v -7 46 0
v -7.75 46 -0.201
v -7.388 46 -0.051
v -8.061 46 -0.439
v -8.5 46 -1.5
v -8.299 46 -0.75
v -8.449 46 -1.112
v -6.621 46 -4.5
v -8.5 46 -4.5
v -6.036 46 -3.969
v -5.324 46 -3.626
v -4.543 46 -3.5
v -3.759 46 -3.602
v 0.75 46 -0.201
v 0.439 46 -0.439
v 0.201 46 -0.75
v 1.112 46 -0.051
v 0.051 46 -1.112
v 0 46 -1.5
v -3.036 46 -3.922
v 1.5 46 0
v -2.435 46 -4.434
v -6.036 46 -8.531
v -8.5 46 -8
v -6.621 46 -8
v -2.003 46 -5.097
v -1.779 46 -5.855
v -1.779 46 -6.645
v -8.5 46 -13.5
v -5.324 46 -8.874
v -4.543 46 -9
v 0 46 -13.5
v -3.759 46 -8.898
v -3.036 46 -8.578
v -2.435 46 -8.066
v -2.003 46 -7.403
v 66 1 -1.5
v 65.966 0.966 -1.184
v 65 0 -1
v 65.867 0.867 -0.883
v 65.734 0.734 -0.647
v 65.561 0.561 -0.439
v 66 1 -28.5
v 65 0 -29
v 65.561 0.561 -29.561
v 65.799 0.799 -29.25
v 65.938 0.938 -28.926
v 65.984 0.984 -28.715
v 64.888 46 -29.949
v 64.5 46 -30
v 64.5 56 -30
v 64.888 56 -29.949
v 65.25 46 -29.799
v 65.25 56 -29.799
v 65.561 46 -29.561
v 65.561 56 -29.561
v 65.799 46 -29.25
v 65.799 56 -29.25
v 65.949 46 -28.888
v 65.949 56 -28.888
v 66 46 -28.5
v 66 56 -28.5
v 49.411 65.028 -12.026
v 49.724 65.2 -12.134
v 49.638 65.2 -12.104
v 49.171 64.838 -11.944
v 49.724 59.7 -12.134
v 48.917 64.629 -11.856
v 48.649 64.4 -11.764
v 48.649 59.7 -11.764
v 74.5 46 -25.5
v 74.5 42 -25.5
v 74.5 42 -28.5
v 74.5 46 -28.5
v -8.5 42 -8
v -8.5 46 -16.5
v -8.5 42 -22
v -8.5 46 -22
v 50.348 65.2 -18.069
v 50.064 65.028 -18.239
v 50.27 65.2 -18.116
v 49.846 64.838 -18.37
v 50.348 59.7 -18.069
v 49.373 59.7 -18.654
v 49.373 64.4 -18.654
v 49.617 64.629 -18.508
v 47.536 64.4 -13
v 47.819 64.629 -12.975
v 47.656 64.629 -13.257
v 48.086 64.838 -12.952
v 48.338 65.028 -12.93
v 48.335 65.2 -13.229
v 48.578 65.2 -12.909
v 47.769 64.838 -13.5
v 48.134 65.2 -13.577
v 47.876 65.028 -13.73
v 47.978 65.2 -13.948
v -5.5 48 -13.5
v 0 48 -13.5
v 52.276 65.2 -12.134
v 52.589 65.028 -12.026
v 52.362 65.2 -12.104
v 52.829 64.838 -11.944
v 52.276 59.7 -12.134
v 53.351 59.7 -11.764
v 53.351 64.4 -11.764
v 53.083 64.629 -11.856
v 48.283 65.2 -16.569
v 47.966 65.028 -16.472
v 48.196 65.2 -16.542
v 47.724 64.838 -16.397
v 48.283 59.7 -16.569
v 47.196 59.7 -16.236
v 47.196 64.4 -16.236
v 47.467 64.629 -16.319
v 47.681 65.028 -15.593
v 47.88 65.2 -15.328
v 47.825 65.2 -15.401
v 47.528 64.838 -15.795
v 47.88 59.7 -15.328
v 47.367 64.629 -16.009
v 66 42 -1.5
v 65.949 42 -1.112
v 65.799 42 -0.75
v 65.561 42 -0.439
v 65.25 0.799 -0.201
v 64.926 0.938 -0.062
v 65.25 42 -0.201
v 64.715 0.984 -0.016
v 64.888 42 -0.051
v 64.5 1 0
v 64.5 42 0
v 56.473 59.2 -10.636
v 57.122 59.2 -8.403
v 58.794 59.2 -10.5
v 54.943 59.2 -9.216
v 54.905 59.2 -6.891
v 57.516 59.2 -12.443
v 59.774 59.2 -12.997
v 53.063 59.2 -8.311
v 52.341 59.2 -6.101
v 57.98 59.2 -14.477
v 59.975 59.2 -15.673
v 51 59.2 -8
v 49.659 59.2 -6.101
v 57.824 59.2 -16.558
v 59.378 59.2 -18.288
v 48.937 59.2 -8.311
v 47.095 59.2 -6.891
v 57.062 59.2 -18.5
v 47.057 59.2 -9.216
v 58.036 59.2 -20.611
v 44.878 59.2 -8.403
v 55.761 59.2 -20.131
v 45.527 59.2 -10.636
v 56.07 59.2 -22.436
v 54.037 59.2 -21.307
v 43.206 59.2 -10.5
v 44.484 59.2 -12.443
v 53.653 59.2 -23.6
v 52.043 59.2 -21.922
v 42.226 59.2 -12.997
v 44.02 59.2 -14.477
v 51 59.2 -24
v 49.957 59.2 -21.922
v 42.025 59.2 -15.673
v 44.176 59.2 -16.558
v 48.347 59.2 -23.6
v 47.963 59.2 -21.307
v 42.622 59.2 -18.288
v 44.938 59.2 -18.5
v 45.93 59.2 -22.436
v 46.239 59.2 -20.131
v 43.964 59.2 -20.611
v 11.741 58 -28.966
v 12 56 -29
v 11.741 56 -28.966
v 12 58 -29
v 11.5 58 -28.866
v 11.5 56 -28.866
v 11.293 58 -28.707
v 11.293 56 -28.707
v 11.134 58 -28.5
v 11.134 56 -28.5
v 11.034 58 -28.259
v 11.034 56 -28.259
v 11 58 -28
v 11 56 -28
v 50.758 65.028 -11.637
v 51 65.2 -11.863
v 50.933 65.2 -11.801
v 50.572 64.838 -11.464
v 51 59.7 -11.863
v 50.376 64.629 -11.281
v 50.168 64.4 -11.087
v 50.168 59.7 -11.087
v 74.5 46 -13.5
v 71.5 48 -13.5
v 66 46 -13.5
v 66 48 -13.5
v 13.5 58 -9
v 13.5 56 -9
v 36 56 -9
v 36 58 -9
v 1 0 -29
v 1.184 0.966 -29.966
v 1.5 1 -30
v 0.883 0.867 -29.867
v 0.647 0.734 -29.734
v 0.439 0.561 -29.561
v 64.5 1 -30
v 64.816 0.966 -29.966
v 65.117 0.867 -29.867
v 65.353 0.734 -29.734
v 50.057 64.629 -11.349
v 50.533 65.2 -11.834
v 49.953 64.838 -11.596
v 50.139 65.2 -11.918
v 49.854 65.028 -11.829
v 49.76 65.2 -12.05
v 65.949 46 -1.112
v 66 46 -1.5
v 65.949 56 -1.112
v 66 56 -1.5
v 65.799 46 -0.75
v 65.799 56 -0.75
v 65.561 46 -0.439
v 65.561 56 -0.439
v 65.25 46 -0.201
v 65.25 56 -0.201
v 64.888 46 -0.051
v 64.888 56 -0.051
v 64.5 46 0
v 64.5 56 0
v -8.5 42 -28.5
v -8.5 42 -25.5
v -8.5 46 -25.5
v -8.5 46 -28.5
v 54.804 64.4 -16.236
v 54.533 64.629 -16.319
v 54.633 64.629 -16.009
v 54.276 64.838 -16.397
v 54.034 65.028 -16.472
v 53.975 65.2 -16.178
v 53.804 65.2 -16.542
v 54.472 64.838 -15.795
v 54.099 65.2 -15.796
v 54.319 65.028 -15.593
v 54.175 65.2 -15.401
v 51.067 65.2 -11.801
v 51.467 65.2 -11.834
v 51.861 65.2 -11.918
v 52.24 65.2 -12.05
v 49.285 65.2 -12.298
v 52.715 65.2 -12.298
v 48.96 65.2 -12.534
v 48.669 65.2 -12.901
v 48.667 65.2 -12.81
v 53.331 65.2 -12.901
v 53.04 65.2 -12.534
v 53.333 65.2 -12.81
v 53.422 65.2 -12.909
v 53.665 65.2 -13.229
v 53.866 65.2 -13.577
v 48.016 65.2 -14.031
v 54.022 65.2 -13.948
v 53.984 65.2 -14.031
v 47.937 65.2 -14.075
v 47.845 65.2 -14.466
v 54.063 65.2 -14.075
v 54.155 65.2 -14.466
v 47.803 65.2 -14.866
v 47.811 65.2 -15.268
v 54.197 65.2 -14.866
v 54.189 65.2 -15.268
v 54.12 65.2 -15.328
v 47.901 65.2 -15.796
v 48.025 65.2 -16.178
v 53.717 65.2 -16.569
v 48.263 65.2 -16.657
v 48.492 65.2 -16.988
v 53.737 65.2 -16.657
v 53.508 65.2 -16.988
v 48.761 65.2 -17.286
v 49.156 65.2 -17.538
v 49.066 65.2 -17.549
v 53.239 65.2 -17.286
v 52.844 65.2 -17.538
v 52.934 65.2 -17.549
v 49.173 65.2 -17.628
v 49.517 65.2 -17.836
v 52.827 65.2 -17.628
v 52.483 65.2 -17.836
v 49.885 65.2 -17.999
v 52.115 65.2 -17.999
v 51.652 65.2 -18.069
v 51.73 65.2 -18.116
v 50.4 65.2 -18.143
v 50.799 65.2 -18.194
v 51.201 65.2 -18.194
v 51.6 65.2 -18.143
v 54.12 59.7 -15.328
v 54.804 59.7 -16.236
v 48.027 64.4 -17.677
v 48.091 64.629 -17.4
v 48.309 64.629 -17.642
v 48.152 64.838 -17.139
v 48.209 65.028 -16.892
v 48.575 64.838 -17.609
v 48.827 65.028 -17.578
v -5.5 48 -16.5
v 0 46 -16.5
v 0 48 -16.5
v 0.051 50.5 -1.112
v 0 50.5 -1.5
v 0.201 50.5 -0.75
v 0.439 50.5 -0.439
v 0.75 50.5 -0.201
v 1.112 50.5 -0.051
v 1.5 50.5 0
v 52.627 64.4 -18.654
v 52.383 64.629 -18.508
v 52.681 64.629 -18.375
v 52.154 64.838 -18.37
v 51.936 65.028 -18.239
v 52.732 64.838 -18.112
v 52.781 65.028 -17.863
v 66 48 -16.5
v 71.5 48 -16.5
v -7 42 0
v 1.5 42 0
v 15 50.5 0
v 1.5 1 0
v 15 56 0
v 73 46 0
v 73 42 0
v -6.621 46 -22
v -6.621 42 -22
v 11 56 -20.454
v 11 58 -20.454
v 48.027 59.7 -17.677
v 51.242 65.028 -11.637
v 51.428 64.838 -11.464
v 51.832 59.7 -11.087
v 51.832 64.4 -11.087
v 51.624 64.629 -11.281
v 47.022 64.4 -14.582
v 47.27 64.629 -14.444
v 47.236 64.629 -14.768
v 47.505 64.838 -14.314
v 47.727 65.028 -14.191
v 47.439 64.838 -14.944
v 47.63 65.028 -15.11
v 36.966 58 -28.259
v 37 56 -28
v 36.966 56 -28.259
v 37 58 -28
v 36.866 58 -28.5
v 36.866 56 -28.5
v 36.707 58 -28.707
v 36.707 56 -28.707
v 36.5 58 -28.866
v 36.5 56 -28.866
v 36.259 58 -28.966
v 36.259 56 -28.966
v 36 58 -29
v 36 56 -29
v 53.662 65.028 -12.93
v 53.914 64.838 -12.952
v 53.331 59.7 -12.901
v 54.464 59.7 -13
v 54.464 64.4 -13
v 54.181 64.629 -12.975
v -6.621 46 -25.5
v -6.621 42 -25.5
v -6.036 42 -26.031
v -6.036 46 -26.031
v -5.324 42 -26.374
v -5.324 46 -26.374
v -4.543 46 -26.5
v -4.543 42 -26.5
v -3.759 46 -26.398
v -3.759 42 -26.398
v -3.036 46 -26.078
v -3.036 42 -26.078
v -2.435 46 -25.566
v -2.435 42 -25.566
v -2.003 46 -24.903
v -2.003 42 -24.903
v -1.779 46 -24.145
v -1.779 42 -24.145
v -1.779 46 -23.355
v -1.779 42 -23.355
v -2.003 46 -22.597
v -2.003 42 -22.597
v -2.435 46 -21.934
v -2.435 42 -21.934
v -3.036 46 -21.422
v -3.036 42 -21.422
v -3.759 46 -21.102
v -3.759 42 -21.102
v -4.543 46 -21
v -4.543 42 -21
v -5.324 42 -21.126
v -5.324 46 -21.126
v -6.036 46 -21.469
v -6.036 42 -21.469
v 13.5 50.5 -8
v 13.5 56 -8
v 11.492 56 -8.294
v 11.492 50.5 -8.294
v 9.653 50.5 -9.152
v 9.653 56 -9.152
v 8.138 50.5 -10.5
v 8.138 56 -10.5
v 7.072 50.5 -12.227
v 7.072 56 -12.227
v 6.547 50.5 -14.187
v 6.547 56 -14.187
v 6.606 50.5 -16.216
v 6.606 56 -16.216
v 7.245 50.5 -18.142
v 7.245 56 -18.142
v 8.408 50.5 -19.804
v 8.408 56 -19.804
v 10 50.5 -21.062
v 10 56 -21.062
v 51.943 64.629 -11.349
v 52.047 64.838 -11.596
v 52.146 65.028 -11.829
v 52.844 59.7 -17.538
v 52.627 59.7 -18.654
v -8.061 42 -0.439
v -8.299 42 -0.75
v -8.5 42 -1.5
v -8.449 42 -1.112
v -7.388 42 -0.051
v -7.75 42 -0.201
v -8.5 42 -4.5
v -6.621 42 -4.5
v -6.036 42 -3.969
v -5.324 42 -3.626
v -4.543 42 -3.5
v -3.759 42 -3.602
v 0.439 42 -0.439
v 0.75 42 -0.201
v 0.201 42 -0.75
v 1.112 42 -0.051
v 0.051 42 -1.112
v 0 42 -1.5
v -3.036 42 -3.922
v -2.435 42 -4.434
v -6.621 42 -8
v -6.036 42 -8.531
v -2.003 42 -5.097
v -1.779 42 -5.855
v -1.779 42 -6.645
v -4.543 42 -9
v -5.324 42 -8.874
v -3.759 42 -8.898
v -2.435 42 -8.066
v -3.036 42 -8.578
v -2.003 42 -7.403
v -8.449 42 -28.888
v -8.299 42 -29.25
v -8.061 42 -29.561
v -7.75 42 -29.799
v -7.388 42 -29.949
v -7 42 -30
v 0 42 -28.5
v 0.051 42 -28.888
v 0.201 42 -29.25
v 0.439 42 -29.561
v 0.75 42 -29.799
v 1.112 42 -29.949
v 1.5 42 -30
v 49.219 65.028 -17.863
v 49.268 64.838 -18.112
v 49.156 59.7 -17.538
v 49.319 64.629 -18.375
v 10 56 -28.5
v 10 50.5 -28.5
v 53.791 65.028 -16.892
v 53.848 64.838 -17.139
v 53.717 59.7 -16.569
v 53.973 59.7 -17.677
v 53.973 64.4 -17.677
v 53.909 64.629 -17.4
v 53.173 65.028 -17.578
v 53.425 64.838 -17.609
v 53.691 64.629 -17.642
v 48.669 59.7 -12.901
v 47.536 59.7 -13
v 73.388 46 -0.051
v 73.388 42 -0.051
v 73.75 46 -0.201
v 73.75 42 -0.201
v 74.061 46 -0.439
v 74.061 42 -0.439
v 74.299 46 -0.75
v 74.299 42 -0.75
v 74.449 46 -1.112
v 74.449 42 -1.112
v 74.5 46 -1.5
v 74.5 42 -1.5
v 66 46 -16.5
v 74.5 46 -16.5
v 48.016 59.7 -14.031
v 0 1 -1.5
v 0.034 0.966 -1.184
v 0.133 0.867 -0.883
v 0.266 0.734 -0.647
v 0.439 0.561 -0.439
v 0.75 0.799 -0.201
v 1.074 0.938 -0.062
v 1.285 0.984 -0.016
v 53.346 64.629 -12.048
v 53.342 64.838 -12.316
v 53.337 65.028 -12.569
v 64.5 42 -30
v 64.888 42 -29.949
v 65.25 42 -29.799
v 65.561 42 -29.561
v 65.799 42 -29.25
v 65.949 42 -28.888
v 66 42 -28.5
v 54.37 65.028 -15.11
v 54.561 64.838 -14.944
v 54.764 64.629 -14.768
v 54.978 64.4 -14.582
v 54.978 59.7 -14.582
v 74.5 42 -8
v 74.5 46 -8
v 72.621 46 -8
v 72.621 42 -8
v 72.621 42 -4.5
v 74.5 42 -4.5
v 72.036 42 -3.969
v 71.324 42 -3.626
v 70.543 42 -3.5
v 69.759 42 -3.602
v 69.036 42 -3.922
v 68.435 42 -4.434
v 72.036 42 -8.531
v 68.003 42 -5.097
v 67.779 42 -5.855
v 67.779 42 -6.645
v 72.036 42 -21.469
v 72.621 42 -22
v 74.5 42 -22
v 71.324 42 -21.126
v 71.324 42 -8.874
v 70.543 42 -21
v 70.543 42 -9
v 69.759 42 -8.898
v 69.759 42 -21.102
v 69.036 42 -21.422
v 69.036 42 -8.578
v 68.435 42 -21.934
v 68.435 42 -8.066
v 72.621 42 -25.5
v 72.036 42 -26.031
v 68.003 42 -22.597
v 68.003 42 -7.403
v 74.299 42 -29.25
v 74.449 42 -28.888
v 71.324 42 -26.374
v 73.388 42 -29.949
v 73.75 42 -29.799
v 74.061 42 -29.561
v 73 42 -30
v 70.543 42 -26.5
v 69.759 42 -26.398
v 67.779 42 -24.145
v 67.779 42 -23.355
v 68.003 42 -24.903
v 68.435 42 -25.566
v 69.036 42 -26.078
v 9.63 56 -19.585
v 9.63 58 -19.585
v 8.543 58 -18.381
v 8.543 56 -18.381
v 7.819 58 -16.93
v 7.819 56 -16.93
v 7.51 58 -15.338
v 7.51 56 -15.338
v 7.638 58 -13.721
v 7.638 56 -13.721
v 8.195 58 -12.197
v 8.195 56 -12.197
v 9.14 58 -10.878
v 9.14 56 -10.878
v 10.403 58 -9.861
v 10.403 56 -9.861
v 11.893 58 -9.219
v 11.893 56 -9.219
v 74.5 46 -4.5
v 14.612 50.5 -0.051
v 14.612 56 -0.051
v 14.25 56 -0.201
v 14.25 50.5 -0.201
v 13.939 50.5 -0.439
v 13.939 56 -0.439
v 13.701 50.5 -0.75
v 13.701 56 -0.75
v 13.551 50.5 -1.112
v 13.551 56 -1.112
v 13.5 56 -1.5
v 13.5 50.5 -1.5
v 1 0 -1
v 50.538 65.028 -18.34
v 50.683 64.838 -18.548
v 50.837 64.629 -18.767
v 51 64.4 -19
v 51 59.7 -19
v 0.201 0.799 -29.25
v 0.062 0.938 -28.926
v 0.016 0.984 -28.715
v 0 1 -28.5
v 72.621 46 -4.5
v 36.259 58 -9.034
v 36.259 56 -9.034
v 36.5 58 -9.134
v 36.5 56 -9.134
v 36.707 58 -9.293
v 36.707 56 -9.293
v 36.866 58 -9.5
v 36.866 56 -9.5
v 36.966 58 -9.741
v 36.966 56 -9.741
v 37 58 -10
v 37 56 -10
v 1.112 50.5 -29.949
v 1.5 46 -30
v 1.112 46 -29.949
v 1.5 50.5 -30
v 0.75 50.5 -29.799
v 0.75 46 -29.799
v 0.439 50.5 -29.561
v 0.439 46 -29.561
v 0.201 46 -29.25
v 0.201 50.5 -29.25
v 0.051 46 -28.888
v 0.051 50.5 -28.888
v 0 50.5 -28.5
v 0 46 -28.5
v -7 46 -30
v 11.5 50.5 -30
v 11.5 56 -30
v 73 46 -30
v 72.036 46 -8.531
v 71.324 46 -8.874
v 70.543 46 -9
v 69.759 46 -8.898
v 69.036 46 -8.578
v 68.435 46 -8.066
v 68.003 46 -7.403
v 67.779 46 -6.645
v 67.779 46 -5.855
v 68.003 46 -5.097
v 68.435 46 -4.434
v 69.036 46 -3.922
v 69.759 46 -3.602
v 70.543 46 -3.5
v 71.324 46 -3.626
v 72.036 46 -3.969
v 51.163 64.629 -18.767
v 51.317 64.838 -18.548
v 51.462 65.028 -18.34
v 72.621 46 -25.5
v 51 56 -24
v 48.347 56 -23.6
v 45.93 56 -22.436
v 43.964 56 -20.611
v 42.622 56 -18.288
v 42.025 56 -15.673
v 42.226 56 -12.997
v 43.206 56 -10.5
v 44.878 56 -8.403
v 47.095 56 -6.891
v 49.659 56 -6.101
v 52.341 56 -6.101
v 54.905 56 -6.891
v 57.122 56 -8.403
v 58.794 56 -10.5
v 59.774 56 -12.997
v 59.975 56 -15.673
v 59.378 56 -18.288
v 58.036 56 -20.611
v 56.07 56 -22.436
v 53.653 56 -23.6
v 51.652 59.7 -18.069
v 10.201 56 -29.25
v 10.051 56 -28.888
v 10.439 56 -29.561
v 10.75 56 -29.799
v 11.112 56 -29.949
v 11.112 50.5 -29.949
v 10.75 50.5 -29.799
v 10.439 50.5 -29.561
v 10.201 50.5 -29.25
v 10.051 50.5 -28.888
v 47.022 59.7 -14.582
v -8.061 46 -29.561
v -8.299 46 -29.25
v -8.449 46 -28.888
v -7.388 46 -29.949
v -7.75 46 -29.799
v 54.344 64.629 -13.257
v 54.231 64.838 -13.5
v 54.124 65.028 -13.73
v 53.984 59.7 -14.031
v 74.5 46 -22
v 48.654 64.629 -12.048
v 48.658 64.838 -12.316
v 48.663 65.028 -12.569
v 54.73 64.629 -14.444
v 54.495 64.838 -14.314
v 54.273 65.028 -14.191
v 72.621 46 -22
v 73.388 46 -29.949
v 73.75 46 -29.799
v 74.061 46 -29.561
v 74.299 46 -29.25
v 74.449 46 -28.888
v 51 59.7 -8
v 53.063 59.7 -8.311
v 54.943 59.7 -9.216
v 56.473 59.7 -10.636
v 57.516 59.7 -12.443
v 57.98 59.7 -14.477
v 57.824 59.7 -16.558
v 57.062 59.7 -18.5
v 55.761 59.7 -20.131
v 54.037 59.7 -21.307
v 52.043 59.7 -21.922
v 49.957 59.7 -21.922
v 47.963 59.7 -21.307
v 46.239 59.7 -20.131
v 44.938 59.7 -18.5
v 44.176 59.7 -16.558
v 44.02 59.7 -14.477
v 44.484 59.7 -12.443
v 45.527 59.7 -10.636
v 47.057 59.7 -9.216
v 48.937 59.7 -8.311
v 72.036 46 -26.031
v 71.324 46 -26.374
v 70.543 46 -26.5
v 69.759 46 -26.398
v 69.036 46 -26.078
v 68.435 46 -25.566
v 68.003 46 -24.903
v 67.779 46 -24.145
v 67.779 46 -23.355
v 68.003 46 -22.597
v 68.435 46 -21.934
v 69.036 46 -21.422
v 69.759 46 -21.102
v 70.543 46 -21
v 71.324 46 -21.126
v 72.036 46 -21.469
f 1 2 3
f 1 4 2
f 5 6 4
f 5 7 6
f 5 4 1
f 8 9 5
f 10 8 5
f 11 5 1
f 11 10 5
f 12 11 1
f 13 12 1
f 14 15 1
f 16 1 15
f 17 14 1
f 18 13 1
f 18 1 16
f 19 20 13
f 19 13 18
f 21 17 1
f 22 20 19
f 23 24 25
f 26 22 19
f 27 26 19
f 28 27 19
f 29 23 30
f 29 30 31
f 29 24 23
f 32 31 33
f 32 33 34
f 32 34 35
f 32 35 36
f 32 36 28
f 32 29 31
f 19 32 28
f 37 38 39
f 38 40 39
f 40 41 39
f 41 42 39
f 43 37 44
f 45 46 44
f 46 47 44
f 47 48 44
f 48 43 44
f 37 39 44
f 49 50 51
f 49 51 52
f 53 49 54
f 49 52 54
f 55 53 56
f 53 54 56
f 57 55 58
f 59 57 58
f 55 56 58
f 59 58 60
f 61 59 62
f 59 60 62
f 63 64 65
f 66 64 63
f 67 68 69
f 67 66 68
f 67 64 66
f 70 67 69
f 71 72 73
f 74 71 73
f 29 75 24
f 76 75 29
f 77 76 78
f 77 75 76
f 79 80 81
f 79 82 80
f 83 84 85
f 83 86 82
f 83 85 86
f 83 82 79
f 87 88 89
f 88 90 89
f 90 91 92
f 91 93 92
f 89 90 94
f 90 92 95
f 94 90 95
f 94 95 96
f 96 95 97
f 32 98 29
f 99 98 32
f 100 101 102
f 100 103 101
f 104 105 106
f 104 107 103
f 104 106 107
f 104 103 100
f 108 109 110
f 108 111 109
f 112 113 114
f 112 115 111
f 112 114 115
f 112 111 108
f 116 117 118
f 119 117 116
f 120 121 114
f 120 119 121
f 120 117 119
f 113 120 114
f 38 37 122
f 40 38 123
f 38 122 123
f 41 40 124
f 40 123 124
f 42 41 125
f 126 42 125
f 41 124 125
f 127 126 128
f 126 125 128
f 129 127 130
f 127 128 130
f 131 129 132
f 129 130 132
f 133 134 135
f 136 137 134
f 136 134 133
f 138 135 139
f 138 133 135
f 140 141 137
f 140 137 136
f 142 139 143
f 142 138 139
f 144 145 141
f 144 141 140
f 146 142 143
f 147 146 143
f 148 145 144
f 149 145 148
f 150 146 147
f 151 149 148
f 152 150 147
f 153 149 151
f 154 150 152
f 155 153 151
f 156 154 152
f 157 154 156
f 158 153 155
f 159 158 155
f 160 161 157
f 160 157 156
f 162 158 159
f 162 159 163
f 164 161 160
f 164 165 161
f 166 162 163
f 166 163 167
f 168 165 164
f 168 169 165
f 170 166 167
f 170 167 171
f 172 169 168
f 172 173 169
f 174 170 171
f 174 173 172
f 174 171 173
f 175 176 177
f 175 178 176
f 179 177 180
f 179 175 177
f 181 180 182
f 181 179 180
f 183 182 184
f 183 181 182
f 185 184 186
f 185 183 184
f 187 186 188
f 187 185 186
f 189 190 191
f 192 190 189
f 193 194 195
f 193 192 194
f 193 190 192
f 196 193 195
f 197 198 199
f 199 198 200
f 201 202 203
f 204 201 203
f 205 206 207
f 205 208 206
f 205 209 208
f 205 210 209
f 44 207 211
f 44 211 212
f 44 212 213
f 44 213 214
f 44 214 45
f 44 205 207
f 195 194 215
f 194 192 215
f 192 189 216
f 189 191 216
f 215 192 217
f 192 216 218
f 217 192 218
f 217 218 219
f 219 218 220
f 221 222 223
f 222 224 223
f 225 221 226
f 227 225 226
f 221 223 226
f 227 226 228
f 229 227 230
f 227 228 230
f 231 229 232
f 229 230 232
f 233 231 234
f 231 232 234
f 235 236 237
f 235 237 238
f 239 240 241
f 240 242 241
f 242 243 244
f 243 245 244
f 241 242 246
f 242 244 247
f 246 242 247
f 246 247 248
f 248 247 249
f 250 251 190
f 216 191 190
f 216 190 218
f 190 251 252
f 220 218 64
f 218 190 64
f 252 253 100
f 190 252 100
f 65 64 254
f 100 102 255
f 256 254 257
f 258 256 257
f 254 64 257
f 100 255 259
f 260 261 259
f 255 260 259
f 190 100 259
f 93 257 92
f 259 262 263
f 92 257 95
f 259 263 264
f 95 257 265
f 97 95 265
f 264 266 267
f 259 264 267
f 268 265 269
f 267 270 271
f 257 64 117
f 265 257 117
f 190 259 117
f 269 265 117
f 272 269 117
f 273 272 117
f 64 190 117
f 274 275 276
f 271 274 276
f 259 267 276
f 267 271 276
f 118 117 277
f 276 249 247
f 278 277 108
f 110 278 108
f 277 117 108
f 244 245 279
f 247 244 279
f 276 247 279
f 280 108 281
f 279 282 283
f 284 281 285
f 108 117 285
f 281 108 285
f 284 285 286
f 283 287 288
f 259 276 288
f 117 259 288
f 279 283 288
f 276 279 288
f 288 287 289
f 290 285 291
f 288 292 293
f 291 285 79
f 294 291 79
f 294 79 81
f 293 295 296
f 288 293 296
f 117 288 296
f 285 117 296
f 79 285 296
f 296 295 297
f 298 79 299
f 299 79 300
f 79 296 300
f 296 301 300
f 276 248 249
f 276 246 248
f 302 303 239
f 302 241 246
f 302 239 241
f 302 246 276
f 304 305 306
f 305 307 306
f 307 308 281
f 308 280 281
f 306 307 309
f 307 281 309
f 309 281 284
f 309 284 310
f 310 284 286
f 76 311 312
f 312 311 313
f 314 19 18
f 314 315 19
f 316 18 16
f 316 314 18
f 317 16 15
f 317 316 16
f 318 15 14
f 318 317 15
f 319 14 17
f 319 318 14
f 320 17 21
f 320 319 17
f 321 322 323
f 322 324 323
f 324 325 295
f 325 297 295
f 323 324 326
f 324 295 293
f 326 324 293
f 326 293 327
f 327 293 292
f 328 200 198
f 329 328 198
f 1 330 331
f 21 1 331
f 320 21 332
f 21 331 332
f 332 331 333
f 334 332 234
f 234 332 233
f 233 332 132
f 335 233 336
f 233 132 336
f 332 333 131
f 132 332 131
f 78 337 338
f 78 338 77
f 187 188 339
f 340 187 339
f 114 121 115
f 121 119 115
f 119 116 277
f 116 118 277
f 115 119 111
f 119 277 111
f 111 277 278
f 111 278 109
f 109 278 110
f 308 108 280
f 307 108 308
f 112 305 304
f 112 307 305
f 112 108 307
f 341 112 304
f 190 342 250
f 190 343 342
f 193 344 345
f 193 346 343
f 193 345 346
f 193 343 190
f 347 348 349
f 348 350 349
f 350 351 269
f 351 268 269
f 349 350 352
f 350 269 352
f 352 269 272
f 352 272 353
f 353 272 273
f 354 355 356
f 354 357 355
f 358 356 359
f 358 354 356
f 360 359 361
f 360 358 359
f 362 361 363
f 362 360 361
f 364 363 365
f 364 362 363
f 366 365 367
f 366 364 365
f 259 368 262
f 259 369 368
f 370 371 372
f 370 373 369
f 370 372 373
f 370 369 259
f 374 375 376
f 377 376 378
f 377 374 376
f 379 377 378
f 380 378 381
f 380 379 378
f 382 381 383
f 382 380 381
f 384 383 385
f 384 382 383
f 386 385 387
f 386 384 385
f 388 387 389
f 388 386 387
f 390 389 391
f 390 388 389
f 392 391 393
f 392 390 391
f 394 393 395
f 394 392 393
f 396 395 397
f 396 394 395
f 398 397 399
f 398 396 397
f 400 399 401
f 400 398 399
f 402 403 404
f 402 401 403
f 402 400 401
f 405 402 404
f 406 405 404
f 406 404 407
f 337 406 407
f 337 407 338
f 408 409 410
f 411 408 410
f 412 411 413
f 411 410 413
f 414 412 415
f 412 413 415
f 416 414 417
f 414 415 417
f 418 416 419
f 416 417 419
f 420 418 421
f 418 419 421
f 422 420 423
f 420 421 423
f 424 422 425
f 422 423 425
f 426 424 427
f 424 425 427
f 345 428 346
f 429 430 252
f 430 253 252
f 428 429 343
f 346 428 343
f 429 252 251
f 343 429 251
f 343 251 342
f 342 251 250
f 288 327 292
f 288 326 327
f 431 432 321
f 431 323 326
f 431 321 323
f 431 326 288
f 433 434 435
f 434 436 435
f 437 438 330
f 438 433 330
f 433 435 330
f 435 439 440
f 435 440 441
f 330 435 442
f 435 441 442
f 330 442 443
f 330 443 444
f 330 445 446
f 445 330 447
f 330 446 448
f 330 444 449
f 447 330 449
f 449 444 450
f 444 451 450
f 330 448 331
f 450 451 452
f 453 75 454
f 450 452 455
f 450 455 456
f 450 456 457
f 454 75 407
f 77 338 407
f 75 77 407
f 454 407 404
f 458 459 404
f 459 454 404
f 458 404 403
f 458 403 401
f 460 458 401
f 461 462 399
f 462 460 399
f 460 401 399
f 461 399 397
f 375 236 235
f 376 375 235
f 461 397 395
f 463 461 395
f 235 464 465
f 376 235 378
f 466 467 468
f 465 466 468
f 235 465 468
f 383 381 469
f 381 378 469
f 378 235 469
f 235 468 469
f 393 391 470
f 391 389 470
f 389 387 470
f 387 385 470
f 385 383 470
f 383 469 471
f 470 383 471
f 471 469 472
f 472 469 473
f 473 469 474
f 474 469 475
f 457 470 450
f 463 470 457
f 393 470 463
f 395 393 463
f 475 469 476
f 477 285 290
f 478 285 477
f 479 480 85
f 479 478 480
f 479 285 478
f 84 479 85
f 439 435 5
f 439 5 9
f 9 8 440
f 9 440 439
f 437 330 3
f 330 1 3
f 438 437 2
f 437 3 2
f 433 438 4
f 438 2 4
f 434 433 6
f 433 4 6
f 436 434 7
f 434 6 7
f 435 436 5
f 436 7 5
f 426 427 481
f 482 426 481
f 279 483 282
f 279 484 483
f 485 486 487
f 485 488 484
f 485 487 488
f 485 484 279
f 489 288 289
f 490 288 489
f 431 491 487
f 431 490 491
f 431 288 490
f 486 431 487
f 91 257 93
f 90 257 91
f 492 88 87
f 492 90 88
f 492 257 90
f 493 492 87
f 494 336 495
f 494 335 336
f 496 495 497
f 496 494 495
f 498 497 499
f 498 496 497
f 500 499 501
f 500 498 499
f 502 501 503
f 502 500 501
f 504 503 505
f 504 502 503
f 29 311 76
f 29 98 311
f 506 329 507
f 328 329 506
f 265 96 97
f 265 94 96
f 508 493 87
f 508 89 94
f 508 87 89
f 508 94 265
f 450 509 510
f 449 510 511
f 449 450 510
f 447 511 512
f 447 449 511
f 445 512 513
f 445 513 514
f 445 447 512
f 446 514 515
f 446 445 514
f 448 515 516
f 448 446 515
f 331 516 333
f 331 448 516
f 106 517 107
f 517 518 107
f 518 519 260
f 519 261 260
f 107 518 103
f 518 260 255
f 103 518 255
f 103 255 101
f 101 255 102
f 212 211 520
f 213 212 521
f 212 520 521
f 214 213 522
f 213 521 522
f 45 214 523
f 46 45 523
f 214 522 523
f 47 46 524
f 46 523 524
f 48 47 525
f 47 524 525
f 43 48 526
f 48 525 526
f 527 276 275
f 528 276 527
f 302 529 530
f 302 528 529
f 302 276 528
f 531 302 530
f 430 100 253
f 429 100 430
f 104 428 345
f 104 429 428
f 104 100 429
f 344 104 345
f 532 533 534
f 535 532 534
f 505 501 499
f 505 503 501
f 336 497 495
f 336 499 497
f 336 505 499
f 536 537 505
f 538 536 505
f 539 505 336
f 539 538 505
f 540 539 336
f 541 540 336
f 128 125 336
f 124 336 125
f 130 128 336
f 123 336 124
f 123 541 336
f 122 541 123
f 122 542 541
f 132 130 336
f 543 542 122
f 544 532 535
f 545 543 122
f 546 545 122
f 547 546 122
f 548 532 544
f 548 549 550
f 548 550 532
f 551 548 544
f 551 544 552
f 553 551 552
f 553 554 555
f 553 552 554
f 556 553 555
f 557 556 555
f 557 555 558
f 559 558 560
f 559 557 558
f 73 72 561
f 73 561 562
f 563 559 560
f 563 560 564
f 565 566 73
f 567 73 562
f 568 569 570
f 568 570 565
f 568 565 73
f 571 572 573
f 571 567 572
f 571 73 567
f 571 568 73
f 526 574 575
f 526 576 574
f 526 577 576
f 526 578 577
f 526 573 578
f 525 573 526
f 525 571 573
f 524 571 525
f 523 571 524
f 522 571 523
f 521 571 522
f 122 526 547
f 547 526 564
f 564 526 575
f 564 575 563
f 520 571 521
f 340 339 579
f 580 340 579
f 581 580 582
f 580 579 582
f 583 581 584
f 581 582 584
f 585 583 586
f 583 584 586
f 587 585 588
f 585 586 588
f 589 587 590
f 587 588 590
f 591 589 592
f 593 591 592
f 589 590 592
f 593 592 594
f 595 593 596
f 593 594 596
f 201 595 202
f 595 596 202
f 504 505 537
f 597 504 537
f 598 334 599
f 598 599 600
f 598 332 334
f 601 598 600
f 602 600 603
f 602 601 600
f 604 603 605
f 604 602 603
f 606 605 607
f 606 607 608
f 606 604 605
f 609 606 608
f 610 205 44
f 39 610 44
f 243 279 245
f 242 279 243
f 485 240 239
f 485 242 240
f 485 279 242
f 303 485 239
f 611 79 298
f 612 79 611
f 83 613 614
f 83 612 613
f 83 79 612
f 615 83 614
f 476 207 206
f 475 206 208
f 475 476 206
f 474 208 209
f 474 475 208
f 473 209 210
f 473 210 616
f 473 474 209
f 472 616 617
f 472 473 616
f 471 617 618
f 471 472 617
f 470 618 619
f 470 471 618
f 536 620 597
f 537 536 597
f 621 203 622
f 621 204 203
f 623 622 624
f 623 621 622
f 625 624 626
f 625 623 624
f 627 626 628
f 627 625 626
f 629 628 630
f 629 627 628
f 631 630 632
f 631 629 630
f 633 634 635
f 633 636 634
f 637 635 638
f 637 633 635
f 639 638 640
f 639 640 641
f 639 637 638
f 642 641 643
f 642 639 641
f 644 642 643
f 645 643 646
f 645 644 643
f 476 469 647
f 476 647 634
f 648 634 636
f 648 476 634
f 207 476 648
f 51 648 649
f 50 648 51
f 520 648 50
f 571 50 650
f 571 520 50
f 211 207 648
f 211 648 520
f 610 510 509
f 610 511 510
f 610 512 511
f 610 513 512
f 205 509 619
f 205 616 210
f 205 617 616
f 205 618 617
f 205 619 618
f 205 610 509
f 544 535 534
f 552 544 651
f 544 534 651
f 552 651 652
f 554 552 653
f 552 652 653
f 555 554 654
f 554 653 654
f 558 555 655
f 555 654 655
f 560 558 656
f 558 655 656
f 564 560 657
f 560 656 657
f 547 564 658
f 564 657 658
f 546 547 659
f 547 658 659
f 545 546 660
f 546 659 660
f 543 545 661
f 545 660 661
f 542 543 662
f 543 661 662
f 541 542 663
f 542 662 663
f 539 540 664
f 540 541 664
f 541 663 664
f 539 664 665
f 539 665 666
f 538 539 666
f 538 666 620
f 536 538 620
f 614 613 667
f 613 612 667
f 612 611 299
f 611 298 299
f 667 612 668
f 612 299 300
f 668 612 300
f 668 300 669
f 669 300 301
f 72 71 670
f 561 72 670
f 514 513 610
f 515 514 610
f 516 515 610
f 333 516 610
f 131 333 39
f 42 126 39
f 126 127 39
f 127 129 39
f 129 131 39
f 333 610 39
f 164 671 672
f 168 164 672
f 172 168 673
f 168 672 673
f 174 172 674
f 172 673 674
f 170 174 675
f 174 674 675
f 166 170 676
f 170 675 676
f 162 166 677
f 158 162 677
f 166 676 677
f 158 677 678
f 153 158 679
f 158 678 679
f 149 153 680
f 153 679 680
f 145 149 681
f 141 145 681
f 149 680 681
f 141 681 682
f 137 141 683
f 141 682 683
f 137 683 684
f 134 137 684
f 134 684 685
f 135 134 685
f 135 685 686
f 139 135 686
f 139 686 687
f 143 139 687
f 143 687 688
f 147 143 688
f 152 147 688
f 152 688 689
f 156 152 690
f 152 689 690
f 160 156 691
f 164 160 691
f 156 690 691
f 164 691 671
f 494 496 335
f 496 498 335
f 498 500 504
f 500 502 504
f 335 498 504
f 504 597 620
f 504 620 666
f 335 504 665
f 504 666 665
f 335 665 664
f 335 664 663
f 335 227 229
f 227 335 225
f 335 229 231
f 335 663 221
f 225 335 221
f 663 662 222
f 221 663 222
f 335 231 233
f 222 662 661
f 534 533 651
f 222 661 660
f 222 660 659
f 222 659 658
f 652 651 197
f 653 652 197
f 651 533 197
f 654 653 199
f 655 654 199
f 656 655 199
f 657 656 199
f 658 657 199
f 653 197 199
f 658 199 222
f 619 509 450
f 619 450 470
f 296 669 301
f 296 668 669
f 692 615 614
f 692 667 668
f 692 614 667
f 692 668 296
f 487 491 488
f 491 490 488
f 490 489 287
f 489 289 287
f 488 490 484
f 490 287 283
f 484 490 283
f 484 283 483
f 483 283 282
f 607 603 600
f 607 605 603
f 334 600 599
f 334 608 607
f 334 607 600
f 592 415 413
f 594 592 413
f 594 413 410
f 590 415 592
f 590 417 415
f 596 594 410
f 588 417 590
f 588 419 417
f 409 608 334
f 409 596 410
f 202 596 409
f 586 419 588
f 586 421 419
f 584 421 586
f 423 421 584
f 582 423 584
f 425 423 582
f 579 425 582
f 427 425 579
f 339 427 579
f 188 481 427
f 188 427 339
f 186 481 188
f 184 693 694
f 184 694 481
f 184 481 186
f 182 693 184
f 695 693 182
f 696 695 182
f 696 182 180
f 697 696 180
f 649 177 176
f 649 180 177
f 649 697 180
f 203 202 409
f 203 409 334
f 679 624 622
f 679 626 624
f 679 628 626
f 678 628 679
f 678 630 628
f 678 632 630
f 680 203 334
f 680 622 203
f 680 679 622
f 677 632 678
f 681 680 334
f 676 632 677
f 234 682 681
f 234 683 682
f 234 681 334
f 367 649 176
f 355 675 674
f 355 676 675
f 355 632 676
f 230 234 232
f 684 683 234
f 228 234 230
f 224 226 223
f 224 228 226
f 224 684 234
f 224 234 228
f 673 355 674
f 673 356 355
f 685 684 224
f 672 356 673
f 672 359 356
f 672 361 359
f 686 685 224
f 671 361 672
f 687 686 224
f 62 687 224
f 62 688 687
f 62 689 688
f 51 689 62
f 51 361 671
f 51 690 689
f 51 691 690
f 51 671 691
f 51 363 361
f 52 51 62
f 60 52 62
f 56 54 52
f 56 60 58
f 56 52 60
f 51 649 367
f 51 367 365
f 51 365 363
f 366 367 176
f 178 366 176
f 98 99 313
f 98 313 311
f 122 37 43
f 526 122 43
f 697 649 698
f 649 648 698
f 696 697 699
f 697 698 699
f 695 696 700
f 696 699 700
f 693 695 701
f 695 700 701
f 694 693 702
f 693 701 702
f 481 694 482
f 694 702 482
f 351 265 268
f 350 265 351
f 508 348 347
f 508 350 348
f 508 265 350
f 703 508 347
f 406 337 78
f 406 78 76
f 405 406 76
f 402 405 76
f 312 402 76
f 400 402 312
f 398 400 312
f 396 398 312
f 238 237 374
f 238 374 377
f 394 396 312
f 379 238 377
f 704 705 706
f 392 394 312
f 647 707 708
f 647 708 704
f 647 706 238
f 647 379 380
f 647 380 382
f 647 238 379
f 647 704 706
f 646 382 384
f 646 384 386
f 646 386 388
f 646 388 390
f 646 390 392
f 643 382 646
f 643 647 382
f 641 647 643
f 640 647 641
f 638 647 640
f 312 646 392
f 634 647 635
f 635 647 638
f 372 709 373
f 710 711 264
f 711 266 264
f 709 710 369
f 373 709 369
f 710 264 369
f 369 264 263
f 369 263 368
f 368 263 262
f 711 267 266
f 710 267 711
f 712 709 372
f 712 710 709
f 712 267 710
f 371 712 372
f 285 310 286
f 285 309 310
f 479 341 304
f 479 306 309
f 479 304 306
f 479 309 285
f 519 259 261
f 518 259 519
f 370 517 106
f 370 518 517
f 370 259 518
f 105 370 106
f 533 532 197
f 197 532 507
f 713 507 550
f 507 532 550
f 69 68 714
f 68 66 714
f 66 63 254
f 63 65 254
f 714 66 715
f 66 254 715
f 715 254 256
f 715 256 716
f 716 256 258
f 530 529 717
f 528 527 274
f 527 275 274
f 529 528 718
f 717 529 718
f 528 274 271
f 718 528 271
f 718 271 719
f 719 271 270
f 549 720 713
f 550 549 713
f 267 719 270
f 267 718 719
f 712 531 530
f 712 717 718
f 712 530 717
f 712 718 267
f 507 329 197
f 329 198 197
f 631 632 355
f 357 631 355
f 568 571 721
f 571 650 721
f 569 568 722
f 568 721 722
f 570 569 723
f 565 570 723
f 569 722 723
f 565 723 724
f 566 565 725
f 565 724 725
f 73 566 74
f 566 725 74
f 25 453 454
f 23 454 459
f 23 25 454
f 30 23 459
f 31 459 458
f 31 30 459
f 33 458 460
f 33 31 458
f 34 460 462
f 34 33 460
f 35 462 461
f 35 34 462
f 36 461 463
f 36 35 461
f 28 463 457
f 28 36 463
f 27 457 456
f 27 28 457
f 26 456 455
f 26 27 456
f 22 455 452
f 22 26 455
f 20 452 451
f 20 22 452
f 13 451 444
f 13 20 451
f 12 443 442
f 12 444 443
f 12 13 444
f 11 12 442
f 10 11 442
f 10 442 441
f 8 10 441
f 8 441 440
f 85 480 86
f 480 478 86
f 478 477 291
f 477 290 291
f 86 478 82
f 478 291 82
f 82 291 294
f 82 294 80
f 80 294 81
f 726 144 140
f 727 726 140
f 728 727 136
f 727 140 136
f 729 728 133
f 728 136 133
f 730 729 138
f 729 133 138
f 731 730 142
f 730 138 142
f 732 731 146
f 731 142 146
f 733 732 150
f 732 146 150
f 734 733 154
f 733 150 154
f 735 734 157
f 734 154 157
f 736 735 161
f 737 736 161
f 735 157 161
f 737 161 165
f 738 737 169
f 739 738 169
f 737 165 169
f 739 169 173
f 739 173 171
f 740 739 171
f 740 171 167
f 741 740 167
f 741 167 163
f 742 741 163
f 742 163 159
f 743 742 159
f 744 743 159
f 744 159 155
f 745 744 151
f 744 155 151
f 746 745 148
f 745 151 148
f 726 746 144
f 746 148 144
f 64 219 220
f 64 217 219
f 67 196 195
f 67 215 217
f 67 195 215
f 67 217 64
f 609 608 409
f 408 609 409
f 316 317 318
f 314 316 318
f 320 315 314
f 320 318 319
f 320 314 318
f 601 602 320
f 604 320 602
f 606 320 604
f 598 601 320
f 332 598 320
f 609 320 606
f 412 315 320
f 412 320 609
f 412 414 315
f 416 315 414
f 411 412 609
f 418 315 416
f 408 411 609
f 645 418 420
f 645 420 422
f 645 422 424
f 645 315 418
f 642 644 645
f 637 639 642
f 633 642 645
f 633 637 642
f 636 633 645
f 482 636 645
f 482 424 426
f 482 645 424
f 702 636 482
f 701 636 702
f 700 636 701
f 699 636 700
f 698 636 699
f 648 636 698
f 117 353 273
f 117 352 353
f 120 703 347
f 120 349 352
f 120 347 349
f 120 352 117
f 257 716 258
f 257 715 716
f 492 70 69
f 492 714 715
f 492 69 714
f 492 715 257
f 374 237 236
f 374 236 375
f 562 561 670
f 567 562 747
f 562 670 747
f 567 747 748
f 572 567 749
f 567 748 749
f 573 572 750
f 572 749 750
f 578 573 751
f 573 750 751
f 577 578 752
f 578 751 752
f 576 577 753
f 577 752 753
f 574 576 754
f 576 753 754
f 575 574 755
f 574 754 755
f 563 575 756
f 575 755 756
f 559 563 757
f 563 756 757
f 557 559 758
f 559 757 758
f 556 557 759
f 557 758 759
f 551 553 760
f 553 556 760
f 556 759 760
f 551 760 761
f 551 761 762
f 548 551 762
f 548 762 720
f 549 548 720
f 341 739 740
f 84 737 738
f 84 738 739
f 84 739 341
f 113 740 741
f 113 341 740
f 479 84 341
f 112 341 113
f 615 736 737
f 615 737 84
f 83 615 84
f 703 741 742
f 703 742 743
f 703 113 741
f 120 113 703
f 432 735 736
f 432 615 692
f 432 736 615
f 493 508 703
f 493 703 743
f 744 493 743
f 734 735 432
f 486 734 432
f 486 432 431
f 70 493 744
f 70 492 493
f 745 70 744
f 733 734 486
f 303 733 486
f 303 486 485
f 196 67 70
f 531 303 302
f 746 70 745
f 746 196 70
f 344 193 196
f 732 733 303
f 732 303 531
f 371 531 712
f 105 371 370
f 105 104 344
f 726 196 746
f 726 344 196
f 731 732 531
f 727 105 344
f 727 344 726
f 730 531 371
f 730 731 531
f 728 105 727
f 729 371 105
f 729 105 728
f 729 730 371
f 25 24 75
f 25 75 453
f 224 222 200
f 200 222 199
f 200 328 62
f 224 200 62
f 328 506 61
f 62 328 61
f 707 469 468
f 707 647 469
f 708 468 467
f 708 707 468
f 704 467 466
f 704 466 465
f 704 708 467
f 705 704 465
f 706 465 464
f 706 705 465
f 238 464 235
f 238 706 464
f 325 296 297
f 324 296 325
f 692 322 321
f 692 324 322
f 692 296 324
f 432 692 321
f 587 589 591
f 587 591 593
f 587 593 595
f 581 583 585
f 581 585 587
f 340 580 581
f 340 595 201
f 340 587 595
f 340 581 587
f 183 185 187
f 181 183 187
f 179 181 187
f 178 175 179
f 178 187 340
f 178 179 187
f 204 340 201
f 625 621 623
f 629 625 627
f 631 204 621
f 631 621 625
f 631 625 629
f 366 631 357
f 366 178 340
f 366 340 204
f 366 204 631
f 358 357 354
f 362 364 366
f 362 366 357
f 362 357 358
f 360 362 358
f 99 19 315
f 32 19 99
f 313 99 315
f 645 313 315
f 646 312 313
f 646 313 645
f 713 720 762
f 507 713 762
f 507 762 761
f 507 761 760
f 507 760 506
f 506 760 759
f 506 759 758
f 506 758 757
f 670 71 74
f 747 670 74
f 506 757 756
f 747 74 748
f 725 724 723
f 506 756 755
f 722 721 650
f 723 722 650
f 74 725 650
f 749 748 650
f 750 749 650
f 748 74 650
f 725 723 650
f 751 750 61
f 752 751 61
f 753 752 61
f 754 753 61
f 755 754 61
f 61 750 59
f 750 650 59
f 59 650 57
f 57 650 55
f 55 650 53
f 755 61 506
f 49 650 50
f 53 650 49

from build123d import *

# Parameters (mm, degrees)
SKETCH1_W            = 66
SKETCH1_H            = 30
BOSS_EXTRUDE1_DEPTH  = 56
CHAMFER1_SIZE        = 1
SKETCH3_W            = 8.5
SKETCH3_H            = 30
BOSS_EXTRUDE2_DEPTH  = 4
CUT_EXTRUDE1_REACH   = 87.86
BOSS_EXTRUDE3_DEPTH  = 1.5
FILLET2_R            = 1.5
FILLET2_OF_MIRROR1_R = 1.5
CUT_EXTRUDE2_DEPTH   = 5.5
FILLET3_R            = 1.5
BOSS_EXTRUDE4_DEPTH  = 2
FILLET4_R            = 1
SKETCH8_R            = 9
BOSS_EXTRUDE5_DEPTH  = 3.2
SKETCH9_R            = 7
BOSS_EXTRUDE6_DEPTH  = 0.5
BOSS_EXTRUDE8_DEPTH  = 5.5
CIRPATTERN1_COUNT    = 15


with BuildPart() as part:
    # Sketch1 → Boss-Extrude1 (new body)
    with BuildSketch(Plane(origin=(0, 0, 0), x_dir=(1, 0, 0), z_dir=(0, 1, 0))):
        with Locations((33, 15)):
            Rectangle(SKETCH1_W, SKETCH1_H)
    extrude(amount=BOSS_EXTRUDE1_DEPTH)

    # Chamfer1
    chamfer1_edges = [part.edges().sort_by_distance(p)[0] for p in [
        (33, 0, -30),
        (66, 0, -15),
        (33, 0, 0),
        (0, 0, -15),
    ]]
    chamfer(chamfer1_edges, length=CHAMFER1_SIZE)

    # Sketch3 → Boss-Extrude2 (add)
    with BuildSketch(Plane(origin=(0, 42, 0), x_dir=(1, 0, 0), z_dir=(0, 1, 0))):
        with Locations((-4.25, 15)):
            Rectangle(SKETCH3_W, SKETCH3_H)
    boss_extrude2 = extrude(amount=BOSS_EXTRUDE2_DEPTH)

    # Sketch4 → Cut-Extrude1 (cut, up to next)
    with BuildSketch(Plane(origin=(0, 46, 0), x_dir=(1, 0, 0), z_dir=(0, 1, 0)), mode=Mode.PRIVATE) as cut_extrude1_sk1:
        with BuildLine():
            Line((-8.5, 8), (-6.621320344, 8))
            ThreePointArc((-6.621320344, 8), (-1.75, 6.25), (-6.621320344, 4.5))
            Line((-6.621320344, 4.5), (-8.5, 4.5))
            Line((-8.5, 4.5), (-8.5, 8))
        make_face()
    cut_extrude1_tool1 = extrude(cut_extrude1_sk1.sketch, amount=-CUT_EXTRUDE1_REACH, mode=Mode.PRIVATE) & part.part
    # Sketch4 → Cut-Extrude1 (cut, up to next)
    with BuildSketch(Plane(origin=(0, 46, 0), x_dir=(1, 0, 0), z_dir=(0, 1, 0)), mode=Mode.PRIVATE) as cut_extrude1_sk2:
        with BuildLine():
            Line((-8.5, 25.5), (-6.621320344, 25.5))
            ThreePointArc((-6.621320344, 25.5), (-1.75, 23.75), (-6.621320344, 22))
            Line((-6.621320344, 22), (-8.5, 22))
            Line((-8.5, 22), (-8.5, 25.5))
        make_face()
    cut_extrude1_tool2 = extrude(cut_extrude1_sk2.sketch, amount=-CUT_EXTRUDE1_REACH, mode=Mode.PRIVATE) & part.part
    cut_extrude1_1 = cut_extrude1_tool1.solids().sort_by_distance((-5.074136, 46, -6.25))[0]
    add(cut_extrude1_1, mode=Mode.SUBTRACT)
    cut_extrude1_2 = cut_extrude1_tool2.solids().sort_by_distance((-5.074136, 46, -23.75))[0]
    add(cut_extrude1_2, mode=Mode.SUBTRACT)
    cut_extrude1 = cut_extrude1_1 + cut_extrude1_2  # Cut-Extrude1 as one shape, for the pattern or mirror that repeats it

    # Sketch5 → Boss-Extrude3 (add, symmetric)
    with BuildSketch(Plane.XY.offset(-15)):
        Polygon((-8.5, 46), (0, 46), (0, 48), (-5.5, 48), align=None)
    boss_extrude3 = extrude(amount=BOSS_EXTRUDE3_DEPTH, both=True)

    # Fillet2
    fillet2_edges = [part.edges().sort_by_distance(p)[0] for p in [
        (-8.5, 44, -30),
        (-8.5, 44, 0),
    ]]
    fillet(fillet2_edges, radius=FILLET2_R)

    # Mirror1: Boss-Extrude2, Cut-Extrude1, Boss-Extrude3 across plane
    add(boss_extrude2.mirror(Plane.ZY.offset(-33)))
    add(cut_extrude1.mirror(Plane.ZY.offset(-33)), mode=Mode.SUBTRACT)
    add(boss_extrude3.mirror(Plane.ZY.offset(-33)))

    # Fillet2 of Mirror1
    fillet2_of_mirror1_edges = [part.edges().sort_by_distance(p)[0] for p in [
        (74.5, 44, -30),
        (74.5, 44, 0),
    ]]
    fillet(fillet2_of_mirror1_edges, radius=FILLET2_OF_MIRROR1_R)

    # Sketch6 → Cut-Extrude2 (cut)
    with BuildSketch(Plane(origin=(0, 56, 0), x_dir=(1, 0, 0), z_dir=(0, 1, 0))):
        with BuildLine():
            Line((13.5, 0), (13.5, 8))
            ThreePointArc((13.5, 8), (6.738519216, 13.188266684), (10, 21.062177826))
            Line((10, 21.062177826), (10, 30))
            Line((10, 30), (0, 30))
            Line((0, 30), (0, 0))
            Line((0, 0), (13.5, 0))
        make_face()
    extrude(amount=-CUT_EXTRUDE2_DEPTH, mode=Mode.SUBTRACT)

    # Fillet3
    fillet3_edges = [part.edges().sort_by_distance(p)[0] for p in [
        (66, 21.5, 0),
        (66, 21.5, -30),
        (0, 48.25, -30),
        (0, 48.25, 0),
        (10, 53.25, -30),
        (13.5, 53.25, 0),
        (0, 21.5, -30),
        (0, 21.5, 0),
        (66, 51, -30),
        (66, 51, 0),
    ]]
    fillet(fillet3_edges, radius=FILLET3_R)

    # Sketch7 → Boss-Extrude4 (add)
    with BuildSketch(Plane(origin=(0, 56, 0), x_dir=(1, 0, 0), z_dir=(0, 1, 0))):
        with BuildLine():
            Line((13.5, 9), (37, 9))
            Line((37, 9), (37, 29))
            Line((37, 29), (11, 29))
            Line((11, 29), (11, 20.454356057))
            ThreePointArc((11, 20.454356057), (7.637997938, 13.720573633), (13.5, 9))
        make_face()
    extrude(amount=BOSS_EXTRUDE4_DEPTH)

    # Fillet4
    fillet4_edges = [part.edges().sort_by_distance(p)[0] for p in [
        (37, 57, -9),
        (37, 57, -29),
        (11, 57, -29),
    ]]
    fillet(fillet4_edges, radius=FILLET4_R)

    # Sketch8 → Boss-Extrude5 (add)
    with BuildSketch(Plane(origin=(0, 56, 0), x_dir=(1, 0, 0), z_dir=(0, 1, 0))):
        with Locations(Location((51, 15, 0), (0, 0, 90))):
            Circle(SKETCH8_R)
    extrude(amount=BOSS_EXTRUDE5_DEPTH)

    # Sketch9 → Boss-Extrude6 (add)
    with BuildSketch(Plane(origin=(0, 59.2, 0), x_dir=(1, 0, 0), z_dir=(0, 1, 0))):
        with Locations(Location((51, 15, 0), (0, 0, 270))):
            Circle(SKETCH9_R)
    extrude(amount=BOSS_EXTRUDE6_DEPTH)

    # Sketch10 → Boss-Extrude8 (add)
    with BuildSketch(Plane(origin=(0, 59.7, 0), x_dir=(1, 0, 0), z_dir=(0, 1, 0))):
        Polygon((50.25, 17.928888995), (51, 19), (51.75, 17.928888995), (51.75, 15), (50.25, 15), align=None)
    boss_extrude8 = extrude(amount=BOSS_EXTRUDE8_DEPTH)

    # CirPattern1: Boss-Extrude8 ×15 about axis
    cirpattern1_axis = Axis((51, 0, -15), (0, 1, 0))
    for i in range(1, CIRPATTERN1_COUNT):
        add(boss_extrude8.rotate(cirpattern1_axis, i * 360 / CIRPATTERN1_COUNT))

    # Sketch13 → Cut-Revolve1 (revolve, cut)
    with BuildSketch(Plane(origin=(51, 0, 0), x_dir=(0, -1, 0), z_dir=(-1, 0, 0))):
        Polygon((-65.2, -18.2), (-65.2, -19), (-64.4, -19), align=None)
    revolve(axis=Axis((51, 66.624672481, -15), (0, -1, 0)), mode=Mode.SUBTRACT)


solid = part.part
